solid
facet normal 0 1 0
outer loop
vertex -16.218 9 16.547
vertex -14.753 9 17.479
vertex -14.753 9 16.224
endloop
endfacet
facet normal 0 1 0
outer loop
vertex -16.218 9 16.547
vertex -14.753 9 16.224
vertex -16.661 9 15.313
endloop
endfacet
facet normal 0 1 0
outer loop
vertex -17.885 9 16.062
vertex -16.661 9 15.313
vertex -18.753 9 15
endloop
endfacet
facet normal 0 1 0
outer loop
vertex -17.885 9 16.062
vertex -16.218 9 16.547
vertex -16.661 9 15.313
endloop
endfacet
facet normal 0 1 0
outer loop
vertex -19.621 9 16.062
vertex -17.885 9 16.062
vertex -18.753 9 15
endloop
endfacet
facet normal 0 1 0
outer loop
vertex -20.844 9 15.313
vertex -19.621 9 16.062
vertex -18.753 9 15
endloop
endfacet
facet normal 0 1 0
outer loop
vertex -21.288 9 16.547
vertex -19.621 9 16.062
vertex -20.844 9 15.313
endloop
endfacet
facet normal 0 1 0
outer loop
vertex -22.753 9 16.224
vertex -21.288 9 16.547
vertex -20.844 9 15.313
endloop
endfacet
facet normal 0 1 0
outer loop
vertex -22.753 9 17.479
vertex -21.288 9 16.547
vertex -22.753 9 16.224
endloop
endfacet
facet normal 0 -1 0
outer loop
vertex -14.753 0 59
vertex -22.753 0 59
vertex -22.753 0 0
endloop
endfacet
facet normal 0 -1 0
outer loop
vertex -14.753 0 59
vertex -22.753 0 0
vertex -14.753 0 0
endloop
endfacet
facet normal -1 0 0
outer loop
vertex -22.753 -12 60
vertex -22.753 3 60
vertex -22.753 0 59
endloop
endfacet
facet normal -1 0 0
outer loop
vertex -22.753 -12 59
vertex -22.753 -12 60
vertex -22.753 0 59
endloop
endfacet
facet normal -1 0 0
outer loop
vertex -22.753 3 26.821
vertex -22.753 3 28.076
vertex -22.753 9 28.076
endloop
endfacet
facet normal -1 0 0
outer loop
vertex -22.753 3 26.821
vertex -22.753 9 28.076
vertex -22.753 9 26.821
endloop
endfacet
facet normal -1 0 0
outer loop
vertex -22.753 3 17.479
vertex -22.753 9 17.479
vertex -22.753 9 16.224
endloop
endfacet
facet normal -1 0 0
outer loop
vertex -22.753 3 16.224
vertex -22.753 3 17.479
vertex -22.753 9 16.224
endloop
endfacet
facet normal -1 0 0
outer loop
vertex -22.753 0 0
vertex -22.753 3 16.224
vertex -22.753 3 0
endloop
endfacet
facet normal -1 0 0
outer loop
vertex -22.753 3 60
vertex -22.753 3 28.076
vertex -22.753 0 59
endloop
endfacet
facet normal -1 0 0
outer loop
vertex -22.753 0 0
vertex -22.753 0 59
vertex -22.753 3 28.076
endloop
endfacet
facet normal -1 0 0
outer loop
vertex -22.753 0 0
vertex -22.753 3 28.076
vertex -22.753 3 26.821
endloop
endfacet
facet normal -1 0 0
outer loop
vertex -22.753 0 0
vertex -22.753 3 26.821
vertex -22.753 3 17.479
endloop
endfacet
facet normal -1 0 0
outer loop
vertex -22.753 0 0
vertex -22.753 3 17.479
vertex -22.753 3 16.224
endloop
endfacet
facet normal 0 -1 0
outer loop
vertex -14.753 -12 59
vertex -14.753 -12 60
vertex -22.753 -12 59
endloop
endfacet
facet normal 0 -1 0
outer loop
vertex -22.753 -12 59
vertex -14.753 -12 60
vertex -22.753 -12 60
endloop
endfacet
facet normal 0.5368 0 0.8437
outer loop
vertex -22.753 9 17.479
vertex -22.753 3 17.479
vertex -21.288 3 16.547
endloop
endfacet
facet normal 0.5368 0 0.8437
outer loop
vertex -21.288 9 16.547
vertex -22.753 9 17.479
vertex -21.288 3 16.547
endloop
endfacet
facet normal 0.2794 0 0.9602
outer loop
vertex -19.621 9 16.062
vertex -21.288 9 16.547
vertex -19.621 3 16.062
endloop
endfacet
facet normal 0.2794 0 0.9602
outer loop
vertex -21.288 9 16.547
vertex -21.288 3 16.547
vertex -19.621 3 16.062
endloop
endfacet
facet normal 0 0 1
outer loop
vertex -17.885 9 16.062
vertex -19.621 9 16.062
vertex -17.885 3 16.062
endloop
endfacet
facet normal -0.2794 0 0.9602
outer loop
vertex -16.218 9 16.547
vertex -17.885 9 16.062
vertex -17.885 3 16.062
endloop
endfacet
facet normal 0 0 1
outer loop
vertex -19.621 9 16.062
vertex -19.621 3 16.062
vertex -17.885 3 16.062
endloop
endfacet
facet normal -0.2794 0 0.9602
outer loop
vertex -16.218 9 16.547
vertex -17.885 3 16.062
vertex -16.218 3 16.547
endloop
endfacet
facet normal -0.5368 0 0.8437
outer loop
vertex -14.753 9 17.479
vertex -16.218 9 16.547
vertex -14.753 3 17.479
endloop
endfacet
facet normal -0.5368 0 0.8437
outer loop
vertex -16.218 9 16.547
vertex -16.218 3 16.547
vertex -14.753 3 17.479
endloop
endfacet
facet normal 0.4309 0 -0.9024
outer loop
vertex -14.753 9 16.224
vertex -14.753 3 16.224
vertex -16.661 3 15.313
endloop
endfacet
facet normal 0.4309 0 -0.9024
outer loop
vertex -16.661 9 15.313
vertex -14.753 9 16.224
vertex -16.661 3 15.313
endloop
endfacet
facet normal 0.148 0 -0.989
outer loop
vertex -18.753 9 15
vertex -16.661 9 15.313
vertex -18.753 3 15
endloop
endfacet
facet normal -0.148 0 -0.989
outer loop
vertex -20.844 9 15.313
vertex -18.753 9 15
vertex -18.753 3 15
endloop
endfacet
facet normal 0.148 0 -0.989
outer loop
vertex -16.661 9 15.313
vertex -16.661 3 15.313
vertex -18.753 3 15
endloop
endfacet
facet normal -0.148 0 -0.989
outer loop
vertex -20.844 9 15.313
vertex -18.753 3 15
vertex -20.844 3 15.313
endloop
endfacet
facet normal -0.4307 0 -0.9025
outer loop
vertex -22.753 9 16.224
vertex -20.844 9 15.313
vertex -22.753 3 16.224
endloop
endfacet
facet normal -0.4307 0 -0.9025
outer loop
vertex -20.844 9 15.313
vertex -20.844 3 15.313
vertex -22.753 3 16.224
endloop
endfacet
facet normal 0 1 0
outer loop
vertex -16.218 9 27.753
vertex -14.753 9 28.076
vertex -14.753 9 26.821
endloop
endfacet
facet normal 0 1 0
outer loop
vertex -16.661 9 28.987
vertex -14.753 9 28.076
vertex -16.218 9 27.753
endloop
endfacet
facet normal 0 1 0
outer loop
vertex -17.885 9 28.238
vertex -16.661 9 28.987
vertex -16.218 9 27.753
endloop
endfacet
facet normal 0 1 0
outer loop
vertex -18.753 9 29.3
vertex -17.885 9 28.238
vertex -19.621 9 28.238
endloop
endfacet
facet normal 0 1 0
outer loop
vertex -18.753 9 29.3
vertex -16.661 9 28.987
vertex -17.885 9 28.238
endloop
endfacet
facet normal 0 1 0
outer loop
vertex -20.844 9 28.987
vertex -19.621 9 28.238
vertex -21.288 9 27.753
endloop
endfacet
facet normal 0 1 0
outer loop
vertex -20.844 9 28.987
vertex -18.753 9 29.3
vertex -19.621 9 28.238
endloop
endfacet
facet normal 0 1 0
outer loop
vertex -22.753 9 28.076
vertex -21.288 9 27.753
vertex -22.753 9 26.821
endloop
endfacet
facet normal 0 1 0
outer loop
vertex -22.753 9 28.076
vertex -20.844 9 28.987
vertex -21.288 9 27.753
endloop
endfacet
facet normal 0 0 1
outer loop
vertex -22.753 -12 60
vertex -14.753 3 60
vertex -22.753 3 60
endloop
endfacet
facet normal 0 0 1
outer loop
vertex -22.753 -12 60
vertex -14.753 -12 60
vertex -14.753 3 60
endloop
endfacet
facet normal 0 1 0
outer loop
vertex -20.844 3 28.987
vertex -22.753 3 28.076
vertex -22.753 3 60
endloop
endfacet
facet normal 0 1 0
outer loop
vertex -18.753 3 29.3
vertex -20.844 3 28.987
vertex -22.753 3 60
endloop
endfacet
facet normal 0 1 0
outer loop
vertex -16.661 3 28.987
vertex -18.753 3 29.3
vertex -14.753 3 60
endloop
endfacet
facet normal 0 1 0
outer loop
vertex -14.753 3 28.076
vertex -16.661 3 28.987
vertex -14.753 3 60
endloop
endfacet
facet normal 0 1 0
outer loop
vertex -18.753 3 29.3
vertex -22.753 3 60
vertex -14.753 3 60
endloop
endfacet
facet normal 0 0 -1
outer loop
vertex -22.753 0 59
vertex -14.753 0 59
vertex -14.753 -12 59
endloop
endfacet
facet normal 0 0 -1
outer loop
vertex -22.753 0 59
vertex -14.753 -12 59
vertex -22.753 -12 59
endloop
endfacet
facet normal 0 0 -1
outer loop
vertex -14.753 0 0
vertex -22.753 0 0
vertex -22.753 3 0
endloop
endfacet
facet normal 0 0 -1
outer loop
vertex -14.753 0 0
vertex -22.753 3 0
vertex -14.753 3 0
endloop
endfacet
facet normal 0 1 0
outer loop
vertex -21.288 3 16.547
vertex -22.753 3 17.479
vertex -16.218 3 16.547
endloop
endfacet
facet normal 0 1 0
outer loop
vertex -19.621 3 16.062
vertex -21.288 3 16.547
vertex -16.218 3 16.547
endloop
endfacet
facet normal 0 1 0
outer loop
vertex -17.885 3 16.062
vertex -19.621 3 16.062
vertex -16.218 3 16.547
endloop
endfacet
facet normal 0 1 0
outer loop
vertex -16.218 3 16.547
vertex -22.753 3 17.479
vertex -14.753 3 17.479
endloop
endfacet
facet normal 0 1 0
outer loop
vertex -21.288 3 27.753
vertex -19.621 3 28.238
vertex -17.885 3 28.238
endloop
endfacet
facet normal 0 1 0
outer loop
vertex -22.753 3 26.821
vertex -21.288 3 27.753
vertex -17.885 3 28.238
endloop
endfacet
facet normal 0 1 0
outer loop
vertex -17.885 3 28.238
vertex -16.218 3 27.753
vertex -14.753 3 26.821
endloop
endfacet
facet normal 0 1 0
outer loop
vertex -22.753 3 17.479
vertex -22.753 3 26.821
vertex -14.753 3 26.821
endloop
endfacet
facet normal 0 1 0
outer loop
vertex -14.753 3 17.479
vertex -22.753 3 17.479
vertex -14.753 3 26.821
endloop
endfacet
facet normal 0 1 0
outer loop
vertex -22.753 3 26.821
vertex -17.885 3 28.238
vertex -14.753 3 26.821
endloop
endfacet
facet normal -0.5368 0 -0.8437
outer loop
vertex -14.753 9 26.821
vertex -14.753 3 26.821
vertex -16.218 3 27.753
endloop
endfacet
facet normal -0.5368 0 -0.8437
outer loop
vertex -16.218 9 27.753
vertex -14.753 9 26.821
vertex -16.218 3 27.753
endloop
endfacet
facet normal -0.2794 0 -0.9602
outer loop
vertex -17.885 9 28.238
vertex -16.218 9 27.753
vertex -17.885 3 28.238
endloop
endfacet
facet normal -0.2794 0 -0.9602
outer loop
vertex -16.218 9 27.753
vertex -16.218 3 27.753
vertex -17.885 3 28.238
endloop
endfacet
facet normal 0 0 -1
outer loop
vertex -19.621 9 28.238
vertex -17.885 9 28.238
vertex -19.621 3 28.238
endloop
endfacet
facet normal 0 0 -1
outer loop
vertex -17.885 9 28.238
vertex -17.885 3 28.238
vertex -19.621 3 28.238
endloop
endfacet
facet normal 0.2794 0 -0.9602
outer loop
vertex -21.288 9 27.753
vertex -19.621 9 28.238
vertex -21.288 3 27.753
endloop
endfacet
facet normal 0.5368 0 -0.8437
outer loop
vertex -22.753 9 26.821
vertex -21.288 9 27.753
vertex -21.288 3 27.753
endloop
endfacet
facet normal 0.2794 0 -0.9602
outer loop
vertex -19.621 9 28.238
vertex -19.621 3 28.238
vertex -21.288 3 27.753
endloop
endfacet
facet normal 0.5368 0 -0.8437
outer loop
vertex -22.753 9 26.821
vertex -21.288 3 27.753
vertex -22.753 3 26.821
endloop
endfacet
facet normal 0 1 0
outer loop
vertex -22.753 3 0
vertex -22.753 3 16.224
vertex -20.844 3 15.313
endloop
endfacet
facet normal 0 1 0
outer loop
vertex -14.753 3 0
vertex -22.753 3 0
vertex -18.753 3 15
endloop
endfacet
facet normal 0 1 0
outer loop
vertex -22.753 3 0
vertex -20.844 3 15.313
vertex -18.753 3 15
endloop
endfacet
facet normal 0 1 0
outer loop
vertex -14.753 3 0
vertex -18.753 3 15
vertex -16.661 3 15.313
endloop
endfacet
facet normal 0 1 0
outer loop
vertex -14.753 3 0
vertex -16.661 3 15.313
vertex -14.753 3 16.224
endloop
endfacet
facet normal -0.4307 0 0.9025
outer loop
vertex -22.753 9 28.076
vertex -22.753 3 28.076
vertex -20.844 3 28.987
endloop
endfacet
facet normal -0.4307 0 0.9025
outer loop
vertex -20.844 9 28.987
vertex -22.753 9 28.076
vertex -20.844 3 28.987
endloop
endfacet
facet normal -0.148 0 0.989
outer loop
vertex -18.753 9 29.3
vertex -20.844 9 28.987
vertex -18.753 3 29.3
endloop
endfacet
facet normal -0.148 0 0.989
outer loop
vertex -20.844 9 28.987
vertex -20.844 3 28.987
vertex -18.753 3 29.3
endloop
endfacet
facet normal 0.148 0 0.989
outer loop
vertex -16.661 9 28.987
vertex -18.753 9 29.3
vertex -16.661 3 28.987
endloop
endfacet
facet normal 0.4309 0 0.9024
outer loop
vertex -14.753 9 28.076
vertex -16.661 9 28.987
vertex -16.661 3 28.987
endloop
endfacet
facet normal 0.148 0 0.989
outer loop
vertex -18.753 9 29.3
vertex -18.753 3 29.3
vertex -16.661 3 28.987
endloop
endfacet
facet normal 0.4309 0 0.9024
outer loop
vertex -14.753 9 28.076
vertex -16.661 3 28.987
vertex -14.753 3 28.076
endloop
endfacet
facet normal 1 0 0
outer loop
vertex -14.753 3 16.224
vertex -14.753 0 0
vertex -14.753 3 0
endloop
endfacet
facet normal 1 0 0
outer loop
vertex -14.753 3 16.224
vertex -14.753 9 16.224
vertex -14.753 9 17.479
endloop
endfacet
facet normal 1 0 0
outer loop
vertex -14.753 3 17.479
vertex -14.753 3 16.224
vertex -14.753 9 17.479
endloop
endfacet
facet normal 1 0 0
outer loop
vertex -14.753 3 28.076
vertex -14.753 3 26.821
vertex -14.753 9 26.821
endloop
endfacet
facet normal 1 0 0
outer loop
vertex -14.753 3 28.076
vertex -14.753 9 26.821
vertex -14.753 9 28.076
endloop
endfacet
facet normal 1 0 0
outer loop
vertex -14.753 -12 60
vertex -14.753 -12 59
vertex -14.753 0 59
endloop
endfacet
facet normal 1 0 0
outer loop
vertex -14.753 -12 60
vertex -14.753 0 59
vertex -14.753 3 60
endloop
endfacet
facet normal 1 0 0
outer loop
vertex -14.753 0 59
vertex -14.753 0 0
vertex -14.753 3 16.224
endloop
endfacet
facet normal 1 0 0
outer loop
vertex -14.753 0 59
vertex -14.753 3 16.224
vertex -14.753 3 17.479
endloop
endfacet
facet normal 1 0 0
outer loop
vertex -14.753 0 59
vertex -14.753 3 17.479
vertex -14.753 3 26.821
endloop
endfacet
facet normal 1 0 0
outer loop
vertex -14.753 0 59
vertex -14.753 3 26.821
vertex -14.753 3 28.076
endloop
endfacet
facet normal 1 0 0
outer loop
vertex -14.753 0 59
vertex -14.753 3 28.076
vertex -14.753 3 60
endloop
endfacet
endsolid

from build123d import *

# Parameters (mm, degrees)
F1_DEPTH = 3
F3_DEPTH = 6
F2_W     = 8
F2_H     = 1
F4_DEPTH = 15


with BuildPart() as f1:
    # F0 (on Front) → F1 (new body)
    with BuildSketch(Plane.XZ):
        with BuildLine():
            ThreePointArc((-22.7528382093, 28.0764238795), (-18.7528382093, 29.3), (-14.7528382093, 28.0764238795))
            Line((-14.7528382093, 28.0764238795), (-14.7528382093, 60))
            Line((-14.7528382093, 60), (-22.7528382093, 60))
            Line((-22.7528382093, 60), (-22.7528382093, 28.0764238795))
        make_face()
        with BuildLine():
            ThreePointArc((-22.7528382093, 16.2235761205), (-18.7528382093, 15), (-14.7528382093, 16.2235761205))
            Line((-14.7528382093, 16.2235761205), (-14.7528382093, 28.0764238795))
            ThreePointArc((-14.7528382093, 28.0764238795), (-18.7528382093, 29.3), (-22.7528382093, 28.0764238795))
            Line((-22.7528382093, 28.0764238795), (-22.7528382093, 16.2235761205))
        make_face()
        with BuildLine():
            Line((-22.7528382093, 0), (-14.7528382093, 0))
            Line((-14.7528382093, 0), (-14.7528382093, 16.2235761205))
            ThreePointArc((-14.7528382093, 16.2235761205), (-18.7528382093, 15), (-22.7528382093, 16.2235761205))
            Line((-22.7528382093, 16.2235761205), (-22.7528382093, 0))
        make_face()
    extrude(amount=-F1_DEPTH)

    # F2 (on face) → F3 (join)
    with BuildSketch(Plane(origin=(0, 3, 0), x_dir=(-1, 0, 0), z_dir=(0, 1, 0))):
        with BuildLine():
            ThreePointArc((22.7528382093, 28.0764238795), (18.7528382093, 29.3), (14.7528382093, 28.0764238795))
            Line((14.7528382093, 28.0764238795), (14.7528382093, 26.8214558758))
            ThreePointArc((14.7528382093, 26.8214558758), (18.7528382093, 28.3), (22.7528382093, 26.8214558758))
            Line((22.7528382093, 26.8214558758), (22.7528382093, 28.0764238795))
        make_face()
        with BuildLine():
            Line((14.7528382093, 17.4785441242), (14.7528382093, 16.2235761205))
            ThreePointArc((14.7528382093, 16.2235761205), (18.7528382093, 15), (22.7528382093, 16.2235761205))
            Line((22.7528382093, 16.2235761205), (22.7528382093, 17.4785441242))
            ThreePointArc((22.7528382093, 17.4785441242), (18.7528382093, 16), (14.7528382093, 17.4785441242))
        make_face()
    extrude(amount=F3_DEPTH)

    # F2 (on face) → F4 (join)
    with BuildSketch(Plane(origin=(0, 3, 0), x_dir=(-1, 0, 0), z_dir=(0, 1, 0))):
        with Locations((18.7528382093, 59.5)):
            Rectangle(F2_W, F2_H)
    extrude(amount=-F4_DEPTH)


solid = f1.part
